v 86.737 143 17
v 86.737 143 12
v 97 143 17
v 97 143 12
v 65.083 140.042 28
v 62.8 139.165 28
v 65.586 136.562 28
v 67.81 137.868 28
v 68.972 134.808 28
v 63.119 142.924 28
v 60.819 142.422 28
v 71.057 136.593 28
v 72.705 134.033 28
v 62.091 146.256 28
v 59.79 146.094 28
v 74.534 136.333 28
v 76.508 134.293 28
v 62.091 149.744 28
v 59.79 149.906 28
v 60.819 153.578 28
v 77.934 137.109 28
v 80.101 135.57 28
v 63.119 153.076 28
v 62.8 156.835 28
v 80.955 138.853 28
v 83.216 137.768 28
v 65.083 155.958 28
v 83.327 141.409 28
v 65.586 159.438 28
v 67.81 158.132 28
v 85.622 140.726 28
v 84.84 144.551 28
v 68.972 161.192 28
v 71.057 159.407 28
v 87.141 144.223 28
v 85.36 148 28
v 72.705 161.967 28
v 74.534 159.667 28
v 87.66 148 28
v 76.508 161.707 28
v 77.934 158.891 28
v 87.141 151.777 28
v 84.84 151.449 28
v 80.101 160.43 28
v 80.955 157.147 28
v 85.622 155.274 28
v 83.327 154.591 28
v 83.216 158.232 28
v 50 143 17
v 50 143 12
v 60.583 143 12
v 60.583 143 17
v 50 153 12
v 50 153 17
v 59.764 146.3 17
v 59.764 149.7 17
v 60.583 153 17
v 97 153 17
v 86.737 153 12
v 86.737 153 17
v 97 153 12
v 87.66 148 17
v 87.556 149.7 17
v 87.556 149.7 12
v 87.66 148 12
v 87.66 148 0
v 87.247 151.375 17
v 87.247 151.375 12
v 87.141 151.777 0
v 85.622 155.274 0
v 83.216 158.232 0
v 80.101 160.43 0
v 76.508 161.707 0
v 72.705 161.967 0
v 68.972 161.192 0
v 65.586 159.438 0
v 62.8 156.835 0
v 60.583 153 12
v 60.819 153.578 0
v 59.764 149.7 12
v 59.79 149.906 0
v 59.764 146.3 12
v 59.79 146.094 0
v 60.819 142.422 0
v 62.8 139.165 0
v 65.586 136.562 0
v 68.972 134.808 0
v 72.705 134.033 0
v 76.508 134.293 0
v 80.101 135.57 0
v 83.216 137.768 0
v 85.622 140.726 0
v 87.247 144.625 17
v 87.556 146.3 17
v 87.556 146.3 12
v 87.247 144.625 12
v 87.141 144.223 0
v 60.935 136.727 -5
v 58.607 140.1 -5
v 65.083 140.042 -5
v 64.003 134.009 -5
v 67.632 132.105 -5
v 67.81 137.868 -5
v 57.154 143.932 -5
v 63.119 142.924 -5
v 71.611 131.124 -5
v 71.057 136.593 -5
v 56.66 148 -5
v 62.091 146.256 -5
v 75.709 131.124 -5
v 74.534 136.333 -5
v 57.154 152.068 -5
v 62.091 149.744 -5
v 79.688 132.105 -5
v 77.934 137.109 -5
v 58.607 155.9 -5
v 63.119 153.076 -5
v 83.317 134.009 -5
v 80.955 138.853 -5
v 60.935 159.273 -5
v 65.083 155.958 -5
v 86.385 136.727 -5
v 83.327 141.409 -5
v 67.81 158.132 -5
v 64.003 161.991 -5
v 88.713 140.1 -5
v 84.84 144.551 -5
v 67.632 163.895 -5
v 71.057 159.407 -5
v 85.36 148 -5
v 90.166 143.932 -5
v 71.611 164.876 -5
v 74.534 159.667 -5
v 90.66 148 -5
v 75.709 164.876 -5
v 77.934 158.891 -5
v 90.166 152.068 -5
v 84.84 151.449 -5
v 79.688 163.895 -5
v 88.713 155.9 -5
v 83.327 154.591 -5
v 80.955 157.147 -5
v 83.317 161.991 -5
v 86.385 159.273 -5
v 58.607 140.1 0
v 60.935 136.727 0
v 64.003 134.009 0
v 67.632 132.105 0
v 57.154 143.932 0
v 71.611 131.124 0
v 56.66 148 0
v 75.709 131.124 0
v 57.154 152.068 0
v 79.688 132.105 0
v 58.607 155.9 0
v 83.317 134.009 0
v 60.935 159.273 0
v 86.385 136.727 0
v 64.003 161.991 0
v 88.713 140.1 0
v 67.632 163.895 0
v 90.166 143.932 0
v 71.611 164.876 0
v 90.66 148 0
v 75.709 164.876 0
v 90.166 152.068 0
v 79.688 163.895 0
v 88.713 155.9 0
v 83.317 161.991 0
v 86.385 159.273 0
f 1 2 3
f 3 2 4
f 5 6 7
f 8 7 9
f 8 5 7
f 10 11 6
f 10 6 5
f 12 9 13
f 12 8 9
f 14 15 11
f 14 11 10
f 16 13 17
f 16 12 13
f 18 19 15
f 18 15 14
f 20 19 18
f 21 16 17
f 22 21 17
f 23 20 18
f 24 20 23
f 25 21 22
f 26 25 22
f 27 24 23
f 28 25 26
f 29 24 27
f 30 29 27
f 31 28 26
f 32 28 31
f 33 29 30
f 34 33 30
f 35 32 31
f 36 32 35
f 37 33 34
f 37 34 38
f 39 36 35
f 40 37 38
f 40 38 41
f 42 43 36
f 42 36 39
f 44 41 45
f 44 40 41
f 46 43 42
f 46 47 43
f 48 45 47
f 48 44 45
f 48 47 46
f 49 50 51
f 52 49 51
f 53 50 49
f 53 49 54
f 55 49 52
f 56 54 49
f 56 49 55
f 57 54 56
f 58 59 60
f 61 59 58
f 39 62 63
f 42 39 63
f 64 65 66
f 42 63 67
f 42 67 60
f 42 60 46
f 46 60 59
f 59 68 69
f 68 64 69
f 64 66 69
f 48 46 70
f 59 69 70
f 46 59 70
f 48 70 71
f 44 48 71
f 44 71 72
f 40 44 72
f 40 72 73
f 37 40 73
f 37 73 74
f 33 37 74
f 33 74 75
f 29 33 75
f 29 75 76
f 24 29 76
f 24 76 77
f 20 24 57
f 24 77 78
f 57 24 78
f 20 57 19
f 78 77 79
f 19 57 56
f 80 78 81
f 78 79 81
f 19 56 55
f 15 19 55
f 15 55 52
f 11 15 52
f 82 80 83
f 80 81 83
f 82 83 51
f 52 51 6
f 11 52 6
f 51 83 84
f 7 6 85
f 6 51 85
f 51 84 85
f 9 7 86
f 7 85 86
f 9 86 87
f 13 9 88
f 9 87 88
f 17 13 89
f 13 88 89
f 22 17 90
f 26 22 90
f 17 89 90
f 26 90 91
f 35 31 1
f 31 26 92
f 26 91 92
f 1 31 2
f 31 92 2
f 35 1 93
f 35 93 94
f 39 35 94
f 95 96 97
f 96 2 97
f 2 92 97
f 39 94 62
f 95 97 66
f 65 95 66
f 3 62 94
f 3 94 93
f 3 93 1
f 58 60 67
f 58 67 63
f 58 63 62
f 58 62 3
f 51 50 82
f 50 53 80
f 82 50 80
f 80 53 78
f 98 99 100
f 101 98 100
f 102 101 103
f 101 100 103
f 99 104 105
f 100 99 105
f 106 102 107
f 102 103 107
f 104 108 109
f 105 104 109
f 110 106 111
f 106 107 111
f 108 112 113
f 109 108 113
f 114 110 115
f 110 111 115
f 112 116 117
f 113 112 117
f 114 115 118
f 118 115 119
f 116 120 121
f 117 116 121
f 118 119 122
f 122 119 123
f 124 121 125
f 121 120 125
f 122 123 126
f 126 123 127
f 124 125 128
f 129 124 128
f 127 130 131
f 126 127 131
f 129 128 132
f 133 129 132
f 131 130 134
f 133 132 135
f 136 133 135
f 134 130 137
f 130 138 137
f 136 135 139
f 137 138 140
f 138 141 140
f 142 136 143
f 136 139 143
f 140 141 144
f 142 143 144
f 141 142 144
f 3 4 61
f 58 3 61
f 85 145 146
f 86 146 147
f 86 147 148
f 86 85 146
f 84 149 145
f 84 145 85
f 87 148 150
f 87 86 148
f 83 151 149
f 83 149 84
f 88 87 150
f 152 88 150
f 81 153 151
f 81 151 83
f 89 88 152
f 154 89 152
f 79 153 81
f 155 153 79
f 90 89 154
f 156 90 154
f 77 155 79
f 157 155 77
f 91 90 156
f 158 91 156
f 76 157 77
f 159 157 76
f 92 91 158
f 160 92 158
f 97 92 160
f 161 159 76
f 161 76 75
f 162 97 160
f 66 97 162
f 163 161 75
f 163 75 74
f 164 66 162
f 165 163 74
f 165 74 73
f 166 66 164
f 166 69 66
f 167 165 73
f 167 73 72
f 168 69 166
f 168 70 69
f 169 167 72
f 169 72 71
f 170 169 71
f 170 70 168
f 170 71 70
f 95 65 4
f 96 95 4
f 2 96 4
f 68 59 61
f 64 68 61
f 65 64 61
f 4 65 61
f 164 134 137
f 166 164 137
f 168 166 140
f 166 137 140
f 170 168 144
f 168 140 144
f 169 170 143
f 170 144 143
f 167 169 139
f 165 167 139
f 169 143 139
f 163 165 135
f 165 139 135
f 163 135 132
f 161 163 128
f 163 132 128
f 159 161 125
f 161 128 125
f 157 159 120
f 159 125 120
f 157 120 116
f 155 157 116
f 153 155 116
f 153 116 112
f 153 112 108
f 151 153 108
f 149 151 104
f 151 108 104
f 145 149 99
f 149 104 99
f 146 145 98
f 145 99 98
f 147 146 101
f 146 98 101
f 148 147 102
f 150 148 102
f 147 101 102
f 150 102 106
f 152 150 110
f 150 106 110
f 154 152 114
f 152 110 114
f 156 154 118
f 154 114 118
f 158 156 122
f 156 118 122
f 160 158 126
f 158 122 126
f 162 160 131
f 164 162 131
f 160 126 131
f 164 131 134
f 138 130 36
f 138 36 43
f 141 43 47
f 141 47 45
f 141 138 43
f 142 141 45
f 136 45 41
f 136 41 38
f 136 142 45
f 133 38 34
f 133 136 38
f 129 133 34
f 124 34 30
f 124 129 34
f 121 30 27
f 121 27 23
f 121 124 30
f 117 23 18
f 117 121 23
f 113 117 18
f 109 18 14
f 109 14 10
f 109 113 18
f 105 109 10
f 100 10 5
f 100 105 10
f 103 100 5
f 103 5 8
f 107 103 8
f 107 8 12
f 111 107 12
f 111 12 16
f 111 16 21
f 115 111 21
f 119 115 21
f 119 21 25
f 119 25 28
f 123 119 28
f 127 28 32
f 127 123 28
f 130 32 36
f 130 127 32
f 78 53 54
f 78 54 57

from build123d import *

# Parameters (mm, degrees)
CYLINDER093_R     = 1.5
CYLINDER093_DEPTH = 14
CYLINDER090_R     = 11.7
CYLINDER090_DEPTH = 33
CYLINDER094_R     = 1.5
CYLINDER094_DEPTH = 14
CYLINDER088_R     = 14
CYLINDER088_DEPTH = 33
BOX016_W          = 47
BOX016_H          = 10
BOX016_DEPTH      = 5
CYLINDER084_R     = 17
CYLINDER084_DEPTH = 5


with BuildPart() as ftinsmount1:
    # Cylinder093 → Cylinder093 (new body)
    with BuildSketch(Plane(origin=(53.66, 148, -15), x_dir=(1, 0, 0), z_dir=(0, 0, 1))):
        Circle(CYLINDER093_R)
    extrude(amount=CYLINDER093_DEPTH)


with BuildPart() as ftinsinnerhole:
    # Cylinder090 → Cylinder090 (new body)
    with BuildSketch(Plane(origin=(73.66, 148, -10), x_dir=(1, 0, 0), z_dir=(0, 0, 1))):
        Circle(CYLINDER090_R)
    extrude(amount=CYLINDER090_DEPTH)


with BuildPart() as fusion039:
    # Cylinder094 → Cylinder094 (new body)
    with BuildSketch(Plane(origin=(93.66, 148, -14), x_dir=(1, 0, 0), z_dir=(0, 0, 1))):
        Circle(CYLINDER094_R)
    extrude(amount=CYLINDER094_DEPTH)

    # Fusion039: union FTInsMount1, FTInsInnerHole
    add(ftinsmount1.part)
    add(ftinsinnerhole.part)


with BuildPart() as feedthrough008:
    # Cylinder088 → Cylinder088 (new body)
    with BuildSketch(Plane(origin=(73.66, 148, -10), x_dir=(1, 0, 0), z_dir=(0, 0, 1))):
        Circle(CYLINDER088_R)
    extrude(amount=CYLINDER088_DEPTH)


with BuildPart() as ftinslug:
    # Box016 → Box016 (new body)
    with BuildSketch(Plane(origin=(50, 143, 7), x_dir=(1, 0, 0), z_dir=(0, 0, 1))):
        with Locations((23.5, 5)):
            Rectangle(BOX016_W, BOX016_H)
    extrude(amount=BOX016_DEPTH)


with BuildPart() as ftinsulator1:
    # Cylinder084 → Cylinder084 (new body)
    with BuildSketch(Plane(origin=(73.66, 148, -10), x_dir=(1, 0, 0), z_dir=(0, 0, 1))):
        Circle(CYLINDER084_R)
    extrude(amount=CYLINDER084_DEPTH)

    # Fusion038: union Feedthrough008, FTInsLug
    add(feedthrough008.part)
    add(ftinslug.part)

    # Cut010: cut Fusion039
    add(fusion039.part, mode=Mode.SUBTRACT)


with BuildPart() as ftinsulator1_1:
    # Cut010 placement: moved
    add(ftinsulator1.part.moved(Location((0, 0, 5))))


solid = ftinsulator1_1.part
